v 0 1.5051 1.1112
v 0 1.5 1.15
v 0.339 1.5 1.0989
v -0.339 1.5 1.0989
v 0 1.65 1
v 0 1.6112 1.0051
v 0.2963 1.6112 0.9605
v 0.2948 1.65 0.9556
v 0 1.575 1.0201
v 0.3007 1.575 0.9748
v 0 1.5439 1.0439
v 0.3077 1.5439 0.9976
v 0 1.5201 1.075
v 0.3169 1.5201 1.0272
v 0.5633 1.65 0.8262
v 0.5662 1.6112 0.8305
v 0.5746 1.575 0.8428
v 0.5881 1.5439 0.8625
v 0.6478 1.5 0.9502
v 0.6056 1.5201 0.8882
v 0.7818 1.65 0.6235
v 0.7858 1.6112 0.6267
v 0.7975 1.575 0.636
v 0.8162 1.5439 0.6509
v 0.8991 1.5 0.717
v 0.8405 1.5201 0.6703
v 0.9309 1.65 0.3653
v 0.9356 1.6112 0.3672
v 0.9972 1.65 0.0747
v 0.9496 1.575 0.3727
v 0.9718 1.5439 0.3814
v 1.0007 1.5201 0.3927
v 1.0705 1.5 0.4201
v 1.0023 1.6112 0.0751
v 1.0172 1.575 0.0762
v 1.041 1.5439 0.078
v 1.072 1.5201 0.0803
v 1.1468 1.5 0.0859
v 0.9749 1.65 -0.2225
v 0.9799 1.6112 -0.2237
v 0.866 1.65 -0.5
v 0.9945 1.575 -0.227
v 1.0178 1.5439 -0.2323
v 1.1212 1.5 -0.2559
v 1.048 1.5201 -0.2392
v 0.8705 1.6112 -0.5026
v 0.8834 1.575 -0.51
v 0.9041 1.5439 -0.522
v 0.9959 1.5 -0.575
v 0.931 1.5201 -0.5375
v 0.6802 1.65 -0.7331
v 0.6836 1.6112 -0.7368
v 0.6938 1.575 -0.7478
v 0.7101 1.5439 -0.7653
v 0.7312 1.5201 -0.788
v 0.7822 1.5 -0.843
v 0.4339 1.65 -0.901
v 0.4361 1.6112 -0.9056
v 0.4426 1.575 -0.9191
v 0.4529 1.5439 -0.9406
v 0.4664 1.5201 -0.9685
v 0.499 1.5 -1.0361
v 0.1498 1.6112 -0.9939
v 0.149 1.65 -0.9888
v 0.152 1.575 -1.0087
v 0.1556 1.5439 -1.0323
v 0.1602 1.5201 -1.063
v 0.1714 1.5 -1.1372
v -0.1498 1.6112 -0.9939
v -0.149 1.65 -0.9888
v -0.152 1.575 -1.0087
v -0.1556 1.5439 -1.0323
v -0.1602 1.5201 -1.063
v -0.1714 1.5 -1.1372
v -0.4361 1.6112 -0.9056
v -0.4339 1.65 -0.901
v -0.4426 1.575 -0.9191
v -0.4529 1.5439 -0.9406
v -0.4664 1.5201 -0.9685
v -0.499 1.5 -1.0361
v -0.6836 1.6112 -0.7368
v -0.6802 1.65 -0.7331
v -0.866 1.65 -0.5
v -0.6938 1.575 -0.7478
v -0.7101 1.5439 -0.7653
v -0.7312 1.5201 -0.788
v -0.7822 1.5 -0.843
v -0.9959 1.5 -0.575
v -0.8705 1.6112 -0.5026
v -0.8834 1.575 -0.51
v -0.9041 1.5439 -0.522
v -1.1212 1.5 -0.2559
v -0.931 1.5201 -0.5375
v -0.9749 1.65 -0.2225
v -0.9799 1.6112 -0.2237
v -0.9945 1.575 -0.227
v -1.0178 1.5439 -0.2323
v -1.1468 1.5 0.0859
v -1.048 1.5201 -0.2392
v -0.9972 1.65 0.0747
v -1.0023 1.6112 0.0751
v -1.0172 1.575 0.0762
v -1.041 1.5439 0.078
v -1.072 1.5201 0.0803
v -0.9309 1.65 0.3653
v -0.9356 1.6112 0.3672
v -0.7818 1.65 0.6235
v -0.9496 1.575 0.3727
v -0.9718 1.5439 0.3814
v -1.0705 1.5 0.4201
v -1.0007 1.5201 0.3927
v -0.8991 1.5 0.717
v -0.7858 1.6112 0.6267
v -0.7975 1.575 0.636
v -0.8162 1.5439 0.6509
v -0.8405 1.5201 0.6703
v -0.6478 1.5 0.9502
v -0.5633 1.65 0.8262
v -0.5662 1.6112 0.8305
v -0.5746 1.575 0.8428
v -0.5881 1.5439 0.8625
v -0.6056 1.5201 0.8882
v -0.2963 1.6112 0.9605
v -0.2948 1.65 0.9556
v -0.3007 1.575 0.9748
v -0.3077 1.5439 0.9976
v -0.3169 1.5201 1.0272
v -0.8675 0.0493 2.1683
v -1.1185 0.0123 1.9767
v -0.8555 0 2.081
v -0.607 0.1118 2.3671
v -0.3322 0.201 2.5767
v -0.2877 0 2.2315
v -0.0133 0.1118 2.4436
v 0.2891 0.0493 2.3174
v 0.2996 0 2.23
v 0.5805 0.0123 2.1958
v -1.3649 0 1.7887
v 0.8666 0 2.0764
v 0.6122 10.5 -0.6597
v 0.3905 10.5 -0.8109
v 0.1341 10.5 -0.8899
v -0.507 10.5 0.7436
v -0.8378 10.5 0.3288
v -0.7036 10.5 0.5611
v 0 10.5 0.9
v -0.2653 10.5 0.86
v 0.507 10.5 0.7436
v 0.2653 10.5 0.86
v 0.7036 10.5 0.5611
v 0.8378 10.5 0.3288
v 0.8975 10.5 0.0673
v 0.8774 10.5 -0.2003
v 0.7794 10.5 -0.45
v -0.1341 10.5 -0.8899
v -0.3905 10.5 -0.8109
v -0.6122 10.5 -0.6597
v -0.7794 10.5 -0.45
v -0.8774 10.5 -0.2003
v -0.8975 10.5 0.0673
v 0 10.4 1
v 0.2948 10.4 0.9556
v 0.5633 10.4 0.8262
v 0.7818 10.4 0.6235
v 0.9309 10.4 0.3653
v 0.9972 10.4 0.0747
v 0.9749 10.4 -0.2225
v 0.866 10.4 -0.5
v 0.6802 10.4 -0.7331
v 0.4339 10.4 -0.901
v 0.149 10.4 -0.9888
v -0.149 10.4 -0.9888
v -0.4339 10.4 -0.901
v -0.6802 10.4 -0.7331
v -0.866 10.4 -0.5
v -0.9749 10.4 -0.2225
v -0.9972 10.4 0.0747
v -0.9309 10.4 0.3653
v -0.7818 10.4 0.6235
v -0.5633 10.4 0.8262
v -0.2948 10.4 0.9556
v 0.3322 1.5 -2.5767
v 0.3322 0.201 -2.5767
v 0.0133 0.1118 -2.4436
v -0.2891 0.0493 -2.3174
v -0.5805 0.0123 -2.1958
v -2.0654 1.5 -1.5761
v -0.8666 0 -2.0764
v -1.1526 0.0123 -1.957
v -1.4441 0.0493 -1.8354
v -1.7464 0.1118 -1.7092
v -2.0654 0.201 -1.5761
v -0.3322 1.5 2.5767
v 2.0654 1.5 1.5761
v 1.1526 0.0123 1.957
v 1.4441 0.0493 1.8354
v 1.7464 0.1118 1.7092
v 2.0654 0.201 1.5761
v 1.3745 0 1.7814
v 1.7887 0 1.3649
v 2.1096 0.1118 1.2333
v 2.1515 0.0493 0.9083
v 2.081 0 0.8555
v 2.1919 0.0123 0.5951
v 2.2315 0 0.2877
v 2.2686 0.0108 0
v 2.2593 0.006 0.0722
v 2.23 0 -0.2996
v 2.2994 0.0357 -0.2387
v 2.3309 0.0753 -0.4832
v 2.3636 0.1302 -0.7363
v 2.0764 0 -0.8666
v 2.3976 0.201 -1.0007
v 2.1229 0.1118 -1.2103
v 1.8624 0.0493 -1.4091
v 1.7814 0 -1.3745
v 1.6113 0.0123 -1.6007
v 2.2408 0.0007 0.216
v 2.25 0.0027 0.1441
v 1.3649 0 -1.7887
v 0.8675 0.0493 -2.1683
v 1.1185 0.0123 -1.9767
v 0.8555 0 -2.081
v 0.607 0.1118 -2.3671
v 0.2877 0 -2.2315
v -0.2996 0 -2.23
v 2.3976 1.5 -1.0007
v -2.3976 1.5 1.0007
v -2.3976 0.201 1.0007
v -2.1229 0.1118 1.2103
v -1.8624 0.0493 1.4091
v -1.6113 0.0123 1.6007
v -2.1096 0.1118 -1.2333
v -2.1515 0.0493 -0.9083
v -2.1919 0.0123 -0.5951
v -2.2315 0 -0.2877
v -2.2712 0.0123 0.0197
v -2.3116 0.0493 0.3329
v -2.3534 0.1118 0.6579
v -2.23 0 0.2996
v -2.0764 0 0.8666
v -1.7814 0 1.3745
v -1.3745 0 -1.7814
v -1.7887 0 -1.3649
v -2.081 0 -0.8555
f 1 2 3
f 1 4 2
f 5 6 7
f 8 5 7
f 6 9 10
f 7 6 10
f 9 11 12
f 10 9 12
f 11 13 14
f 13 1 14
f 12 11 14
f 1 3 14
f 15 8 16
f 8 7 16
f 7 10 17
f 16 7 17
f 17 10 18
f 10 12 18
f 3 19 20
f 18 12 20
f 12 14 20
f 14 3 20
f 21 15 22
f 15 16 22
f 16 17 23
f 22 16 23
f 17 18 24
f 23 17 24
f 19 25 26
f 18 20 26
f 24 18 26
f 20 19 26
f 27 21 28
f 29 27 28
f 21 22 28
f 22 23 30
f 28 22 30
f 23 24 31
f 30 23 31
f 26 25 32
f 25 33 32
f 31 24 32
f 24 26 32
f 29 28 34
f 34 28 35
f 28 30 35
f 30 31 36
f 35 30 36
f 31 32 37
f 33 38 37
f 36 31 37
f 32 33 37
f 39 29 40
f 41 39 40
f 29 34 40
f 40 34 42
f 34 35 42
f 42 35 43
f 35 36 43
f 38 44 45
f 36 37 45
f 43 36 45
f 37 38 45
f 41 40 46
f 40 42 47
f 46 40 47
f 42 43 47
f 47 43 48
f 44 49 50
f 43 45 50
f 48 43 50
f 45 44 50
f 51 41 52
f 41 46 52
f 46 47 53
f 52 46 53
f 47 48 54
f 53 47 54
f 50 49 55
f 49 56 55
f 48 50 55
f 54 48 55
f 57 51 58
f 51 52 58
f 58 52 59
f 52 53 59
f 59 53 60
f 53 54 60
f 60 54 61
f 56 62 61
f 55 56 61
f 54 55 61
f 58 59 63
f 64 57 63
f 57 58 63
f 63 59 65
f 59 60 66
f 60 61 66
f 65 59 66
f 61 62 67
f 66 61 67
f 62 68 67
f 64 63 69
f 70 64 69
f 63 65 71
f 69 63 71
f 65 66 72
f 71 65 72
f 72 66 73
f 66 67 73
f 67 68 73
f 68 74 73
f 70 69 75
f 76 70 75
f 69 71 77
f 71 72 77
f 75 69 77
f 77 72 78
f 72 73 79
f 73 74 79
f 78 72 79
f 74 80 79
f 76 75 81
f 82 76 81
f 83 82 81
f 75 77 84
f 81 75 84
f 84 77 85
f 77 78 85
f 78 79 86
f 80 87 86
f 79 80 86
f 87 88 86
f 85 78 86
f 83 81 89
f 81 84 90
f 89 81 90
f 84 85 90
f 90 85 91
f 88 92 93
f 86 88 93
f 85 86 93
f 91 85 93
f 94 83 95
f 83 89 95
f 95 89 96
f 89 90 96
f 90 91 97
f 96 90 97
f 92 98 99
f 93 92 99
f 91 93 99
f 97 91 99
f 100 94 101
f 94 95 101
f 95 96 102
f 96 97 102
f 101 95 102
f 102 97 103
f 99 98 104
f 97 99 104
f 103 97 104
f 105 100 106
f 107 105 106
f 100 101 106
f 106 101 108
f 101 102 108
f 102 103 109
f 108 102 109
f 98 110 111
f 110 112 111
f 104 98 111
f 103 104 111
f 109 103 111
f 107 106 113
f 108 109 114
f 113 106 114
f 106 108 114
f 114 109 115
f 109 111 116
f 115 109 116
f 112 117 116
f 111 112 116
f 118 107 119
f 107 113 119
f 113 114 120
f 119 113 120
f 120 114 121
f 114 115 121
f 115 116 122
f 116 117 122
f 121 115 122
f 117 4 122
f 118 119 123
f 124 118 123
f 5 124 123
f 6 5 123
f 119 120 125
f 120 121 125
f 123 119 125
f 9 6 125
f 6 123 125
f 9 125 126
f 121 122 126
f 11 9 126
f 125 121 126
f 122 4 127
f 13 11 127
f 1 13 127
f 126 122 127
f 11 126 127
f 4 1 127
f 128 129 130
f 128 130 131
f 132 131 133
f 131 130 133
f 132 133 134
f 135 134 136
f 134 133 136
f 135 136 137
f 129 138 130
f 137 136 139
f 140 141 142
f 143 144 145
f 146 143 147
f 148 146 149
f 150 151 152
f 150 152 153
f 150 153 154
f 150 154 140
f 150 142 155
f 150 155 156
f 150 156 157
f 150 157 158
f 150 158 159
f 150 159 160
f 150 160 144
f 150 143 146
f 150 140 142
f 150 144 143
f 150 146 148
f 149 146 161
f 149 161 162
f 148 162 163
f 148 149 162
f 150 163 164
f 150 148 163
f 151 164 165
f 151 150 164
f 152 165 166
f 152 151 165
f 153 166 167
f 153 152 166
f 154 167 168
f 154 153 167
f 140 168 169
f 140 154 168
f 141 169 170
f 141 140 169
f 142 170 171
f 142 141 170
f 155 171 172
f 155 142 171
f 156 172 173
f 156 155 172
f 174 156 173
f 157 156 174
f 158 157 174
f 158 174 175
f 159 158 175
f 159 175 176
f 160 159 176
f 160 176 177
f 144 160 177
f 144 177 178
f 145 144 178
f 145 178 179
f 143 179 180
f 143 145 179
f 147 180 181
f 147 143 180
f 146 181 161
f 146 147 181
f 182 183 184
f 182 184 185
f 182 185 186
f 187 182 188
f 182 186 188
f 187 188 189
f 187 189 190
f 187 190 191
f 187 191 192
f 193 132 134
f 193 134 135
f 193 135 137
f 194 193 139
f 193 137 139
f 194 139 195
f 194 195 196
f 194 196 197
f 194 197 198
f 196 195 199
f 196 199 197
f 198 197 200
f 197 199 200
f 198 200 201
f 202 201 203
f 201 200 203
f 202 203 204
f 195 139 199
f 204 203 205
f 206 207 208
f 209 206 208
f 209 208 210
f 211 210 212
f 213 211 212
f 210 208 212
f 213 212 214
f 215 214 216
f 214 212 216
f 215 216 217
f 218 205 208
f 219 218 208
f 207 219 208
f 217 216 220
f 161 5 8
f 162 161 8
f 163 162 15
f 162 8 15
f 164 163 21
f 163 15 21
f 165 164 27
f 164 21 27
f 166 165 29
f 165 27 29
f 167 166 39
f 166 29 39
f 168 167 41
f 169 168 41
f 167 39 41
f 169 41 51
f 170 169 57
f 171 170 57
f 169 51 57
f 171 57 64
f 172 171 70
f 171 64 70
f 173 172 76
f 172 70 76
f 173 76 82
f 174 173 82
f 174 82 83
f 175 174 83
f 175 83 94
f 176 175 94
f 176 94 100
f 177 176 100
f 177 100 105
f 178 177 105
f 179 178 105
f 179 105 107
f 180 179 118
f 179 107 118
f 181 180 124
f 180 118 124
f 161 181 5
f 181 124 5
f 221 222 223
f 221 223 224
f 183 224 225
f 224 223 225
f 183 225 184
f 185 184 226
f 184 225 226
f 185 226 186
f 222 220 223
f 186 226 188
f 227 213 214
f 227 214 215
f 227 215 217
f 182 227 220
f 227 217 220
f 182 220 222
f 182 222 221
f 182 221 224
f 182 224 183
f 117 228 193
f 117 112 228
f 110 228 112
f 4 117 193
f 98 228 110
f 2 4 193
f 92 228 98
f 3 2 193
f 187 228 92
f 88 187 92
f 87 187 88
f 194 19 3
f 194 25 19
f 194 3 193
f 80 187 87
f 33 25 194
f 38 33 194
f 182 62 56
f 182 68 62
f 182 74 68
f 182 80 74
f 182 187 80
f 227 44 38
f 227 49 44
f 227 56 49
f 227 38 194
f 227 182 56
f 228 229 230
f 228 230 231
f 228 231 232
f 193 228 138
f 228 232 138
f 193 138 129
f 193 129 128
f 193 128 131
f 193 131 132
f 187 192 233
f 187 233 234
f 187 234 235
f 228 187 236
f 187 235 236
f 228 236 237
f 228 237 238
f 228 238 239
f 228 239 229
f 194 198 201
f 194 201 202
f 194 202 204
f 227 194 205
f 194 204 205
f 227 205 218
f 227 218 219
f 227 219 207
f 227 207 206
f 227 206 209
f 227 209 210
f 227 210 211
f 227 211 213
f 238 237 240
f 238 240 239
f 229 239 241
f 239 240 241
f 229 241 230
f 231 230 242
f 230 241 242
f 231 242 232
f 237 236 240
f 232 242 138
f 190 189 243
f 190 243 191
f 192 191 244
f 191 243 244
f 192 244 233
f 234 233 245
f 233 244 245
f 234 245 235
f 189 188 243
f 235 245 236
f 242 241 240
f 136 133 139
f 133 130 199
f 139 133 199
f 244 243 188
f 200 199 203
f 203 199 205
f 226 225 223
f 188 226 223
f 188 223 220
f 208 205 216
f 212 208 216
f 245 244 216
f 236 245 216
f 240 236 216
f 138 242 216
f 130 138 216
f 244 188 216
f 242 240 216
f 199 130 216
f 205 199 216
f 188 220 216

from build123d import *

# Parameters (mm, degrees)
BOSS_EXTRUDE2_DEPTH = 1.5
SKETCH3_OUTSIDE_W   = 13.432
SKETCH3_OUTSIDE_H   = 13.79
SKETCH3_OUTSIDE_R   = 2.25
CUT_EXTRUDE2_DEPTH  = 1.5
CUT_EXTRUDE2_DRAFT  = 60
SKETCH4_R           = 1
BOSS_EXTRUDE3_DEPTH = 9
CHAMFER1_SIZE       = 0.1
FILLET1_R           = 0.15


with BuildPart() as part:
    # Sketch1 → Boss-Extrude2 (new body)
    with BuildSketch(Plane(origin=(0, 0, 0), x_dir=(1, 0, 0), z_dir=(0, 1, 0))):
        Polygon((2.065411664, -1.576094749), (2.397643923, 1.000651596), (0.332232259, 2.576746345), (-2.065411664, 1.576094749), (-2.397643923, -1.000651596), (-0.332232259, -2.576746345), align=None)
    extrude(amount=BOSS_EXTRUDE2_DEPTH)


with BuildPart() as cut_extrude2_tool:
    # Sketch3 outside → Cut-Extrude2 (with draft: the straight prism first)
    with BuildSketch(Plane(origin=(0, 0, 0), x_dir=(1, 0, 0), z_dir=(0, 1, 0))):
        Rectangle(SKETCH3_OUTSIDE_W, SKETCH3_OUTSIDE_H)
        Circle(SKETCH3_OUTSIDE_R, mode=Mode.SUBTRACT)
    extrude(amount=CUT_EXTRUDE2_DEPTH)
    # Cut-Extrude2: the draft: its side faces are tilted about the plane it starts from
    cut_extrude2_sides = [cut_extrude2_tool.faces().sort_by_distance(p)[0] for p in [
        (0, 0.75, 6.895),
        (6.716, 0.75, 0),
        (0, 0.75, -6.895),
        (-6.716, 0.75, 0),
        (-2.25, 0.75, 0),
    ]]
    draft(cut_extrude2_sides, Plane(origin=(0, 0, 0), x_dir=(1, 0, 0), z_dir=(0, 1, 0)), CUT_EXTRUDE2_DRAFT)


with BuildPart() as part_1:
    add(part.part)

    # Cut-Extrude2: cut by cut_extrude2_tool
    add(cut_extrude2_tool.part, mode=Mode.SUBTRACT)

    # Sketch4 → Boss-Extrude3 (add)
    with BuildSketch(Plane(origin=(0, 1.5, 0), x_dir=(1, 0, 0), z_dir=(0, 1, 0))):
        with Locations(Location((0, 0, 0), (0, 0, 270))):
            Circle(SKETCH4_R)
    extrude(amount=BOSS_EXTRUDE3_DEPTH)

    # Chamfer1
    chamfer1_edges = [part_1.edges().sort_by_distance(p)[0] for p in [
        (0, 10.5, -1),
    ]]
    chamfer(chamfer1_edges, length=CHAMFER1_SIZE)

    # Fillet1
    fillet1_edges = [part_1.edges().sort_by_distance(p)[0] for p in [
        (0, 1.5, -1),
    ]]
    fillet(fillet1_edges, radius=FILLET1_R)


solid = part_1.part
